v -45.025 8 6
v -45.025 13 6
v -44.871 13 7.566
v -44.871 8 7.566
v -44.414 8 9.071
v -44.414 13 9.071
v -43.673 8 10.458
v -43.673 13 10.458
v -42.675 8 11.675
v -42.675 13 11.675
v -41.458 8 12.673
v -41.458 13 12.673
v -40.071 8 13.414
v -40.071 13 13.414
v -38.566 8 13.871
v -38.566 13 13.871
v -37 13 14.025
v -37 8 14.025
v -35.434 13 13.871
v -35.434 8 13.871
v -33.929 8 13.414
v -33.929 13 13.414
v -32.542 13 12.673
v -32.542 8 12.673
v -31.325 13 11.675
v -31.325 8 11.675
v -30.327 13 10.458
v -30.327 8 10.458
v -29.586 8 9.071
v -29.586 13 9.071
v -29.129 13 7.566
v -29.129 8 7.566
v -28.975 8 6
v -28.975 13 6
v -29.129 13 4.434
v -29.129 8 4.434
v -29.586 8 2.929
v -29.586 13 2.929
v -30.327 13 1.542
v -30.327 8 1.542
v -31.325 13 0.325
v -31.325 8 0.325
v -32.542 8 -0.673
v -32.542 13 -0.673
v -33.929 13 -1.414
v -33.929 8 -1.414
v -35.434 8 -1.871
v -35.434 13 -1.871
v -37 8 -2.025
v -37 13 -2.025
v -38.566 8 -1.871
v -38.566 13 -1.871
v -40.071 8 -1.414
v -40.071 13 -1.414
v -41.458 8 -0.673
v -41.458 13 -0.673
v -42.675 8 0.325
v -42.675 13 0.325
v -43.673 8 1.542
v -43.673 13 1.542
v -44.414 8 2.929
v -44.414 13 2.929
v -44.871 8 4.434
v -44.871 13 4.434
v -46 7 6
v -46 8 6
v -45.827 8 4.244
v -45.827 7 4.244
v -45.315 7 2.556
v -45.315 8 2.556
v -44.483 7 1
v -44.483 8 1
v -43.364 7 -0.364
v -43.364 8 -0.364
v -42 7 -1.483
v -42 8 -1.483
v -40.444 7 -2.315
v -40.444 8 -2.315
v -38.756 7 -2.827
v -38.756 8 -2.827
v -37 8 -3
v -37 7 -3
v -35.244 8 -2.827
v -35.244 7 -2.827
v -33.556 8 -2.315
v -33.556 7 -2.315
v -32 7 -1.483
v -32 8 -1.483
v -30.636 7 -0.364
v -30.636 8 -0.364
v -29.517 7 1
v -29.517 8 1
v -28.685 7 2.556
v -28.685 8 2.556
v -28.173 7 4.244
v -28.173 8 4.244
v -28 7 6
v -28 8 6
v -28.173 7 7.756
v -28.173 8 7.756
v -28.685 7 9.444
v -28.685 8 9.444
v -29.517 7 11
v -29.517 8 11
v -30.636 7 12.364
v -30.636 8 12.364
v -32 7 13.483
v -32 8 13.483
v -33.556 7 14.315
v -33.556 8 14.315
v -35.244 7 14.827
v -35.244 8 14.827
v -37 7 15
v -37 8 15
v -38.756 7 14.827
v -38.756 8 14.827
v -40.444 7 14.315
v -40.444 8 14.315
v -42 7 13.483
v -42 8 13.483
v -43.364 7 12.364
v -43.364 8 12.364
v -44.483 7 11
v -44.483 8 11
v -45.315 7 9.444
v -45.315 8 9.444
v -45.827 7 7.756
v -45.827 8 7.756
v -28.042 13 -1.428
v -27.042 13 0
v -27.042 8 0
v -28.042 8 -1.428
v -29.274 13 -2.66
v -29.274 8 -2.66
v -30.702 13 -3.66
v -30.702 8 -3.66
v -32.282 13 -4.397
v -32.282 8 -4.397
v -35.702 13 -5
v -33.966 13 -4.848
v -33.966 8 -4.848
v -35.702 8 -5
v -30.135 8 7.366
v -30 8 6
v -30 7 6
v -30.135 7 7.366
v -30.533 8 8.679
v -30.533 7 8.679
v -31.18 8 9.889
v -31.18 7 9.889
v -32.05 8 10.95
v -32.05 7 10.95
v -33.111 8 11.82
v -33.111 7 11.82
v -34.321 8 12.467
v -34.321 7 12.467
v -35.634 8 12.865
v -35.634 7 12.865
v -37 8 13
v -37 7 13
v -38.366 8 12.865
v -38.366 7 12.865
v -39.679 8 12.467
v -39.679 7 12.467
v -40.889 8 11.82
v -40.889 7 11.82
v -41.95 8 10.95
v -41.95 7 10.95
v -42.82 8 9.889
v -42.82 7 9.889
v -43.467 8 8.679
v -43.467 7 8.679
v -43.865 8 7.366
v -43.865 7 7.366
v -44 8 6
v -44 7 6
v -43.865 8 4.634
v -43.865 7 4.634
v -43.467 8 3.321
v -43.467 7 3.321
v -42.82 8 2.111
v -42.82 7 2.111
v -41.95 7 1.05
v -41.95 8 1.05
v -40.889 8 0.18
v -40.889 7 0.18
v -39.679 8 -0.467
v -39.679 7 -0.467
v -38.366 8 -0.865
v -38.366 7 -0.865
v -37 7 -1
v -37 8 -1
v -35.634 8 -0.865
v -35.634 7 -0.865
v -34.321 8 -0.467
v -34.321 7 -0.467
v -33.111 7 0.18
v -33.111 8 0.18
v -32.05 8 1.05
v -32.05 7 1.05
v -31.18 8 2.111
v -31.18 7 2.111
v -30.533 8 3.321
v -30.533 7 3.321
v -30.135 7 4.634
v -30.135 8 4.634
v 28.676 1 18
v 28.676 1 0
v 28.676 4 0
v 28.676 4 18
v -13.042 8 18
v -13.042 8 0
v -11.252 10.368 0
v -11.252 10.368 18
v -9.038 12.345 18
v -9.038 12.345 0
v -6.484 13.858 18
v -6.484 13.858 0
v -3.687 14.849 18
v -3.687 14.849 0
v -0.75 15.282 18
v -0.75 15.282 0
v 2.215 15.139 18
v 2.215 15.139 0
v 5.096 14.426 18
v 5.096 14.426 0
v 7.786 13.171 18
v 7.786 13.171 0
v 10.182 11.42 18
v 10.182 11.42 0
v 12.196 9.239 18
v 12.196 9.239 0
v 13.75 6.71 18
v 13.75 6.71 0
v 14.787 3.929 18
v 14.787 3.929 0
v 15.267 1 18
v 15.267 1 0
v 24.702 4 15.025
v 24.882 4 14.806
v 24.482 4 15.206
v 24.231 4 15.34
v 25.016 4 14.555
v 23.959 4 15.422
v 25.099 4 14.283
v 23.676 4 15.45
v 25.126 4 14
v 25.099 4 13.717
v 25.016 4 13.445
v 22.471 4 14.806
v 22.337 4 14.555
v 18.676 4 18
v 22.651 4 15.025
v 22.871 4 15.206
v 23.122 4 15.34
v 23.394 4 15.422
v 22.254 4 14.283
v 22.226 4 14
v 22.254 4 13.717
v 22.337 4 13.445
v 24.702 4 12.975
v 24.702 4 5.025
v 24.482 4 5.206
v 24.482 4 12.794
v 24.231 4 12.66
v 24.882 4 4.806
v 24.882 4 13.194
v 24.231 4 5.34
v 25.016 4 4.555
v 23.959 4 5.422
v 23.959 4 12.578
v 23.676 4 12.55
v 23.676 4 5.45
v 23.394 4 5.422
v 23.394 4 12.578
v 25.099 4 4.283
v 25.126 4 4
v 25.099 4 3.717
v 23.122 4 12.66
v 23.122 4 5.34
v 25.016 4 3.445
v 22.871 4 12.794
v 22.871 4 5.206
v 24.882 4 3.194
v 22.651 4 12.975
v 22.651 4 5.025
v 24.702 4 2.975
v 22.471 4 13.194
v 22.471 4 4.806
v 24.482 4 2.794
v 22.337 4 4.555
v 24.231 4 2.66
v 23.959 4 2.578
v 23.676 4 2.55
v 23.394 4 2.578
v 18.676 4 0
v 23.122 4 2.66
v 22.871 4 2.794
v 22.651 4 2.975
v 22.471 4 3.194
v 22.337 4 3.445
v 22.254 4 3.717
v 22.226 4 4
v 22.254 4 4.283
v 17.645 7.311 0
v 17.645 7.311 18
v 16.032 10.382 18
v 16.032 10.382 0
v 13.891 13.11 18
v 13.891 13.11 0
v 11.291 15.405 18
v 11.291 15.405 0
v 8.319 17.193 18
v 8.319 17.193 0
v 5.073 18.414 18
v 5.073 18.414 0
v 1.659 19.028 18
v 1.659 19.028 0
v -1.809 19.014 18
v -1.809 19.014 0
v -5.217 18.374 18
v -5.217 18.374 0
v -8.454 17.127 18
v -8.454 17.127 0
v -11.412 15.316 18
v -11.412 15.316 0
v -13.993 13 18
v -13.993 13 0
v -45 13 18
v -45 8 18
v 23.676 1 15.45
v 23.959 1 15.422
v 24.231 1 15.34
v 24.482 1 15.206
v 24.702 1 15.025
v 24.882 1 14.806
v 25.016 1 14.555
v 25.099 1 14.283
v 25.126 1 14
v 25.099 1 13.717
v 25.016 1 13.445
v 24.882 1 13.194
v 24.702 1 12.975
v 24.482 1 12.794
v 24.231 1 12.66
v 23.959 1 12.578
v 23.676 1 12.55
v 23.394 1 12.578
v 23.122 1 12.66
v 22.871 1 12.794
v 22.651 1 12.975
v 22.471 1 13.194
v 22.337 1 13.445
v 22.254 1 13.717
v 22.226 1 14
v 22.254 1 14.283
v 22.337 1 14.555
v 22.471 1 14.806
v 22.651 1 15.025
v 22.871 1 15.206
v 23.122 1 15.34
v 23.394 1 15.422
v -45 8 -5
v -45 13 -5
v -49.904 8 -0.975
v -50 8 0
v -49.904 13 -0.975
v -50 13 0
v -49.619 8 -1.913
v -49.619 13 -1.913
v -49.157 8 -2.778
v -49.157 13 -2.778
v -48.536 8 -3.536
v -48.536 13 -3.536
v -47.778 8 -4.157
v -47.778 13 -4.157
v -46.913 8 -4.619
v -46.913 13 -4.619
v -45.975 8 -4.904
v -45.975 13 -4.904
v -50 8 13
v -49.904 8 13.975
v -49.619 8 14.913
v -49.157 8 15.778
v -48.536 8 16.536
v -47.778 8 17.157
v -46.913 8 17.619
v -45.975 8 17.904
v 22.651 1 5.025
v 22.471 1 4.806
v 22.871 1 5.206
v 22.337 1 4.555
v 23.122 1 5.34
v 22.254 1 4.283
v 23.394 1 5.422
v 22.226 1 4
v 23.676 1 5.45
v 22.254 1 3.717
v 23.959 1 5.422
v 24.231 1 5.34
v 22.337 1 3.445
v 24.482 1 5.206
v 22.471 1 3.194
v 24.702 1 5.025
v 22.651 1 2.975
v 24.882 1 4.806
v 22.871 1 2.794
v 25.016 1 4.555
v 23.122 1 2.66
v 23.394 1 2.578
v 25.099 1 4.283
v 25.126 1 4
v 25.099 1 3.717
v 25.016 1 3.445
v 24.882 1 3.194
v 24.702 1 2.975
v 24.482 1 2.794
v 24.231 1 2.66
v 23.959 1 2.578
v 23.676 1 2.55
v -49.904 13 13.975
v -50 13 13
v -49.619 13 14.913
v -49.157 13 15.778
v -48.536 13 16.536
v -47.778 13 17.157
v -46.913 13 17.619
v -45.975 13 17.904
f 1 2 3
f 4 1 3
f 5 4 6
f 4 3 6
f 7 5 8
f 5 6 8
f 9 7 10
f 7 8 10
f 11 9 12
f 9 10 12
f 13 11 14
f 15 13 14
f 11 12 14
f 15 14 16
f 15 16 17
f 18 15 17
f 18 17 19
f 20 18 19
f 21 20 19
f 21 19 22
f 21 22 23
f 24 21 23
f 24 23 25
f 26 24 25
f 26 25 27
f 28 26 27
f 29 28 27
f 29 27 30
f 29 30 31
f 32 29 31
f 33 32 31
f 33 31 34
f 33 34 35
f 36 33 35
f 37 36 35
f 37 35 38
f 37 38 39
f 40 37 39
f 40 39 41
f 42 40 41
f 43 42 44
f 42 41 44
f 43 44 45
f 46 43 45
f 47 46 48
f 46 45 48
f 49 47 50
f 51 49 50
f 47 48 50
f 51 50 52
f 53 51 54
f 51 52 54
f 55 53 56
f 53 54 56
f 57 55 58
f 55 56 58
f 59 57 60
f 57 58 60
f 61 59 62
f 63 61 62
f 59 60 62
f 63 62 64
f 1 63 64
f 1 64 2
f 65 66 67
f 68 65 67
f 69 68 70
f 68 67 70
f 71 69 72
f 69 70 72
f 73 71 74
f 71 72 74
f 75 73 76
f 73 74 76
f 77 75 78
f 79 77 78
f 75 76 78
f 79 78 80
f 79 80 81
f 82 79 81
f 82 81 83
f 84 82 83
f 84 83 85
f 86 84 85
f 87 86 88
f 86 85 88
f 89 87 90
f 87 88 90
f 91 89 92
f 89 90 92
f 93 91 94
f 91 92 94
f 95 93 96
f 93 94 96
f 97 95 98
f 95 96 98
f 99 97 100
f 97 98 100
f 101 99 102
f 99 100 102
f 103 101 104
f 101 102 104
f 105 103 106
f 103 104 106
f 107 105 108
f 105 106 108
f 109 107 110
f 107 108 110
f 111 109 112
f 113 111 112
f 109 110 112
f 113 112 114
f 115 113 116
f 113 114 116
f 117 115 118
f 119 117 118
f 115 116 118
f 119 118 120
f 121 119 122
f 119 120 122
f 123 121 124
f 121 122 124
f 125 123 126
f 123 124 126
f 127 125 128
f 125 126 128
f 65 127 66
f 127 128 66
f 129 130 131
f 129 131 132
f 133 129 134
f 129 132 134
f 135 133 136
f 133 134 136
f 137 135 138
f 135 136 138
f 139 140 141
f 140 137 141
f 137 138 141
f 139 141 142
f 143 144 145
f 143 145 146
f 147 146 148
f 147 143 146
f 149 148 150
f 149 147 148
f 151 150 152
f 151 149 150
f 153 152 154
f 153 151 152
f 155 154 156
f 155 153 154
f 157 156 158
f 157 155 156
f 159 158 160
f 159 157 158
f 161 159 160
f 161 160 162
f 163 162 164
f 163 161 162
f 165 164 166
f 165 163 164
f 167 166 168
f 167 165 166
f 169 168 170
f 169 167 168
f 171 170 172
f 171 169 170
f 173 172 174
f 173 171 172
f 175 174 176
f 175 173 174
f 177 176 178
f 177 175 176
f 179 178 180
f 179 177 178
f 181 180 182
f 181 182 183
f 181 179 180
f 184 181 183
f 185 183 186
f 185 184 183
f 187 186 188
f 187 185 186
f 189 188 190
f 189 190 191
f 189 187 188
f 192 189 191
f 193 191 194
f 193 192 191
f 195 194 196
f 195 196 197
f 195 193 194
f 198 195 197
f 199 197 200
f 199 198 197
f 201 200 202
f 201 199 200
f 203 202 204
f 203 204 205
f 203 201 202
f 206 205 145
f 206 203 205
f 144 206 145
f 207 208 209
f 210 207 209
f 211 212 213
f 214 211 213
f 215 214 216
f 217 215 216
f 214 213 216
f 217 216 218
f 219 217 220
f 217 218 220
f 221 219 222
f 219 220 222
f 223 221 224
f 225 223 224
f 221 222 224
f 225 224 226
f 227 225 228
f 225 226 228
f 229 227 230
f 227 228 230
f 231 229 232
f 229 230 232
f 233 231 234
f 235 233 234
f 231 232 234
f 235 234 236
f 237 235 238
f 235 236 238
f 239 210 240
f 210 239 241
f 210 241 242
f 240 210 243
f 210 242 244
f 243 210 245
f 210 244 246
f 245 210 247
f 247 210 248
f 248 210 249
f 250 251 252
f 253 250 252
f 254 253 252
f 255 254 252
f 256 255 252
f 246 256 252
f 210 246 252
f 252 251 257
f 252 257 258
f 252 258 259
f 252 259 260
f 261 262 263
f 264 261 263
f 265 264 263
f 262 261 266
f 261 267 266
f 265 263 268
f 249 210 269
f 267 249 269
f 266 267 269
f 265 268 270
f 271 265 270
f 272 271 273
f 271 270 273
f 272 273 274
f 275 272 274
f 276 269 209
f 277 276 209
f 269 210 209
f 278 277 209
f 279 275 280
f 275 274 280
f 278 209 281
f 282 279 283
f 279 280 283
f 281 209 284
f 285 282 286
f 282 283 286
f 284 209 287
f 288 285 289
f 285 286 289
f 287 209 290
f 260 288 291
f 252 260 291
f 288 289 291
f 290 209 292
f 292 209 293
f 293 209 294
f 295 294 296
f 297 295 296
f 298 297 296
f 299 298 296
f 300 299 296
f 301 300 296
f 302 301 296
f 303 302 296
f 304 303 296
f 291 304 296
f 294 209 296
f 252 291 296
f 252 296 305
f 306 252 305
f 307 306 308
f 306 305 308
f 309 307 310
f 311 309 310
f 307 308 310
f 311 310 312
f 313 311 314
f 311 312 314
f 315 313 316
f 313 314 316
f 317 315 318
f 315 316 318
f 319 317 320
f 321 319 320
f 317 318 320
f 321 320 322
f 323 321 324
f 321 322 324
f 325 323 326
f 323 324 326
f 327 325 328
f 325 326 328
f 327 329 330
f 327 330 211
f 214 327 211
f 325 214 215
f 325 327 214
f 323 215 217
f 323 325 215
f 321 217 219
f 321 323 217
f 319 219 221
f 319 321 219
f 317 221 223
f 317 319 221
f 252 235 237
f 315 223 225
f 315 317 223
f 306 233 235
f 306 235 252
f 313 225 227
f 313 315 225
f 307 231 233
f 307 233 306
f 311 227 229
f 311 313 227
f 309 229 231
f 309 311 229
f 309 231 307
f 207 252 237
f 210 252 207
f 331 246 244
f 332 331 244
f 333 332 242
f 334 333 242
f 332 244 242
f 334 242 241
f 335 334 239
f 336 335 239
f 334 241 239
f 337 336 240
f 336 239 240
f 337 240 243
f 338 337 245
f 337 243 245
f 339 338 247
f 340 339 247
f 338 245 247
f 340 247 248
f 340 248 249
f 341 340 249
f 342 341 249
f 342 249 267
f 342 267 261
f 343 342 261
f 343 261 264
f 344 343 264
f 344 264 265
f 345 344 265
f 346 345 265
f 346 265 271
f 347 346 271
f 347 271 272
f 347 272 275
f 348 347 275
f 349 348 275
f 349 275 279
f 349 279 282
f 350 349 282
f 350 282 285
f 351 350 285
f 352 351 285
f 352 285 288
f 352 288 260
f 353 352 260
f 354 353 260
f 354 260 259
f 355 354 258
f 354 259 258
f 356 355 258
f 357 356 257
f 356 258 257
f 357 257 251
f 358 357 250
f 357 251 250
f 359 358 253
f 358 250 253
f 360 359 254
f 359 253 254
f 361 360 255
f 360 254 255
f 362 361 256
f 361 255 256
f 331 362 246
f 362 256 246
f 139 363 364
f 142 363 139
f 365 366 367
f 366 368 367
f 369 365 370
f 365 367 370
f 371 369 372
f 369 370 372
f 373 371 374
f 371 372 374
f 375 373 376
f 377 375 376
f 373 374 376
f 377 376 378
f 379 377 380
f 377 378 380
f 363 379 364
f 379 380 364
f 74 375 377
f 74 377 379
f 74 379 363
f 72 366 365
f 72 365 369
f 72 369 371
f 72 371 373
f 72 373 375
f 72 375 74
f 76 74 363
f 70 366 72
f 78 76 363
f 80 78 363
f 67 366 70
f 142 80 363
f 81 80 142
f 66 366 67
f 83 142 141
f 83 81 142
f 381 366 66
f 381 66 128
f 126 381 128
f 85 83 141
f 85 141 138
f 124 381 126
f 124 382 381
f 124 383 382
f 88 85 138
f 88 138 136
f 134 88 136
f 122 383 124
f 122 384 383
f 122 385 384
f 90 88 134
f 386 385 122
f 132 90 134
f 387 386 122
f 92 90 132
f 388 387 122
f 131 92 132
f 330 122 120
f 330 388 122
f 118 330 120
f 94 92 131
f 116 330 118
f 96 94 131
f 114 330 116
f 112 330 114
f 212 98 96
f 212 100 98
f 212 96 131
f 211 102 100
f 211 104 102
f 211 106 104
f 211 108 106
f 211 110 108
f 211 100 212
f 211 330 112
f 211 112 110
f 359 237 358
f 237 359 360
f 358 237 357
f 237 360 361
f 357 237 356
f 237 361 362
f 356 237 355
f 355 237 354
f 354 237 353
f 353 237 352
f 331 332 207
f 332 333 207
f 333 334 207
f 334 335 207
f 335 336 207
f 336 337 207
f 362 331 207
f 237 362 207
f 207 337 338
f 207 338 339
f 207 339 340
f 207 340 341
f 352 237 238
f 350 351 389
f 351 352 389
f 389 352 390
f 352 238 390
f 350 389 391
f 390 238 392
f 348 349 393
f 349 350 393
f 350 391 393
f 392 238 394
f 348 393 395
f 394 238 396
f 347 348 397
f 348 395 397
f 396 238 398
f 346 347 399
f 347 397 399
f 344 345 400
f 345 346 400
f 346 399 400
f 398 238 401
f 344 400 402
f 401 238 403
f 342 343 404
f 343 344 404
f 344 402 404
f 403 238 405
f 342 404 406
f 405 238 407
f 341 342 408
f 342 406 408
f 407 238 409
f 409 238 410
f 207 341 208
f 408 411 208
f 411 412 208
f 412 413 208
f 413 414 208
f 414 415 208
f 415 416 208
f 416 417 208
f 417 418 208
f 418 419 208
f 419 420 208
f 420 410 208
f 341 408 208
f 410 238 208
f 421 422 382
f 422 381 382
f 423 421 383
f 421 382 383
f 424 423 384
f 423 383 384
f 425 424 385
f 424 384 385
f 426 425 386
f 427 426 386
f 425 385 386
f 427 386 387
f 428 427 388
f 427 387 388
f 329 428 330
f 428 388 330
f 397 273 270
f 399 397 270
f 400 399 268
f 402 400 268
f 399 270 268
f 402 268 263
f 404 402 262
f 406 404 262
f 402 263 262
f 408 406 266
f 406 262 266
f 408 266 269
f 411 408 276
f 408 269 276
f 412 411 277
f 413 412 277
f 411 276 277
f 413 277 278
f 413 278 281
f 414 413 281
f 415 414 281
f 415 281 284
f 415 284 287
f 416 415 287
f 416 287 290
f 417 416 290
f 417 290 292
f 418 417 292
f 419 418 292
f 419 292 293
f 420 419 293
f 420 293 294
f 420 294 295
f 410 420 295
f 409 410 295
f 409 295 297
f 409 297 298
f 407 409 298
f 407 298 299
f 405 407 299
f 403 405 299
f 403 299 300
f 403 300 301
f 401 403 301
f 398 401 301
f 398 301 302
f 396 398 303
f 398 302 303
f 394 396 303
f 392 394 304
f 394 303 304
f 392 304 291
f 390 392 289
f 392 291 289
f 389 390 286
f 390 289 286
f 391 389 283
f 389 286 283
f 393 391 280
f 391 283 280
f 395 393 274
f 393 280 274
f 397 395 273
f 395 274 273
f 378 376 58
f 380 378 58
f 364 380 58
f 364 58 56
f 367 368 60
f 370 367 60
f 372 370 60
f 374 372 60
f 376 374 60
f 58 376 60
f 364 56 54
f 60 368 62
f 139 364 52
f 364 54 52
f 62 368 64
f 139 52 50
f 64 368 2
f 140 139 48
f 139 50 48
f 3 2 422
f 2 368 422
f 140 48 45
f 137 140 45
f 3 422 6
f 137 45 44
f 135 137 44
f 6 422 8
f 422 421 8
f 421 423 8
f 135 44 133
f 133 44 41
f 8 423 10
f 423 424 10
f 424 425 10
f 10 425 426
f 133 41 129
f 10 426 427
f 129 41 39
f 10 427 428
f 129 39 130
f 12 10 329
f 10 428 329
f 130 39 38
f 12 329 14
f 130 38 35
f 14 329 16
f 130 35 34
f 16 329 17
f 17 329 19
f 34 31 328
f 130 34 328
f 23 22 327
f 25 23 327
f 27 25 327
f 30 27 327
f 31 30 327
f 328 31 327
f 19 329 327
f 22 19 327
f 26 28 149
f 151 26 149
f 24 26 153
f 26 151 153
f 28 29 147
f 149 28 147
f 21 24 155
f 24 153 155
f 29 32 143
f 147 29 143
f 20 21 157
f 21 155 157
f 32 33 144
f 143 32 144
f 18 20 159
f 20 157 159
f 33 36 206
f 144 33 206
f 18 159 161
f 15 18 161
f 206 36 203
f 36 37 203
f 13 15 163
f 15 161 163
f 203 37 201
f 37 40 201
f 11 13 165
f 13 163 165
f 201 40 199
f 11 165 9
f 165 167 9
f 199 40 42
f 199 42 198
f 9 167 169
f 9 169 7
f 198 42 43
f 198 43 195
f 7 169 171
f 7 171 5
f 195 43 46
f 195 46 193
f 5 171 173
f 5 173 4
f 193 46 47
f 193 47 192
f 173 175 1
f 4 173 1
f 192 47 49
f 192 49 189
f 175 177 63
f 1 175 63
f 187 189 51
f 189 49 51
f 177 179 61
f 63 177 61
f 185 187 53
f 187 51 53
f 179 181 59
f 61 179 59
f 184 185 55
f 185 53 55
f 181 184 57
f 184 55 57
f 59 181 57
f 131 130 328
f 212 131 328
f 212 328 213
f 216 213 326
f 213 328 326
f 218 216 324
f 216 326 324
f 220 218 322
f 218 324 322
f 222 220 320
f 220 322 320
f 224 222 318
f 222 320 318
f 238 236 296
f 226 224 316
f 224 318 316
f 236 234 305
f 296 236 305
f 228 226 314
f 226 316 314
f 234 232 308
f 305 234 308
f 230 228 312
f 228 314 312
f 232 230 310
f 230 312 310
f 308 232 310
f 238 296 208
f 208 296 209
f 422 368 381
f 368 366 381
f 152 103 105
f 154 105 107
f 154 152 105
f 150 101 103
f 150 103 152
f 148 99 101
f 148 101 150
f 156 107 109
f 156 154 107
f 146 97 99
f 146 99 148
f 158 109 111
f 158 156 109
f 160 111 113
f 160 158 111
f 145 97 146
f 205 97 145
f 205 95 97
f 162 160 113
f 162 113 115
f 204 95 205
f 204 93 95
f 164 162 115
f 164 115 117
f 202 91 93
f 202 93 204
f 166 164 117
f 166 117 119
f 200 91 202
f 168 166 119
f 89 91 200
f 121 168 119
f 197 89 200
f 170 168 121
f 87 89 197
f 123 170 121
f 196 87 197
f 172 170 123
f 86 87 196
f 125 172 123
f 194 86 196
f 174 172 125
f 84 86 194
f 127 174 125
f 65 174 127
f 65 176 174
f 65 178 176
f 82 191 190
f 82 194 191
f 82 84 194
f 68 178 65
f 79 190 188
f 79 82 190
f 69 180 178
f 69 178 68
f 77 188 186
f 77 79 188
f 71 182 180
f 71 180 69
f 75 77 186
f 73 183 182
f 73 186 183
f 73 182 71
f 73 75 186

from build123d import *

# Parameters (mm, degrees)
BOSS_EXTRUDE1_DEPTH = 18
SKETCH3_R           = 1.45
CUT_EXTRUDE1_DEPTH  = 56.244999774
SKETCH5_W           = 22.958144304
SKETCH5_H           = 5
BOSS_EXTRUDE2_DEPTH = 5
SKETCH6_R           = 8.025
CUT_EXTRUDE2_DEPTH  = 55.479353888
SKETCH7_R           = 9
SKETCH7_R_2         = 7
BOSS_EXTRUDE3_DEPTH = 1
FILLET1_R           = 5
FILLET2_R           = 10


with BuildPart() as part:
    # Sketch1 → Boss-Extrude1 (new body)
    with BuildSketch(Plane.XY):
        with BuildLine():
            Line((15.267285286, 1), (28.676455767, 1))
            Line((28.676455767, 1), (28.676455767, 4))
            Line((28.676455767, 4), (18.676455767, 4))
            ThreePointArc((18.676455767, 4), (5.072789326, 18.414038353), (-13.99321264, 13))
            Line((-13.99321264, 13), (-50, 13))
            Line((-50, 13), (-50, 8))
            Line((-50, 8), (-13.041855696, 8))
            ThreePointArc((-13.041855696, 8), (3.67261953, 14.852672008), (15.267285286, 1))
        make_face()
    extrude(amount=BOSS_EXTRUDE1_DEPTH)

    # Sketch3 → Cut-Extrude1 (cut, through all)
    with BuildSketch(Plane(origin=(0, 4, 0), x_dir=(1, 0, 0), z_dir=(0, 1, 0))):
        with Locations(Location((23.676455767, -4, 0), (0, 0, 270))):
            Circle(SKETCH3_R)
        with Locations(Location((23.676455767, -14, 0), (0, 0, 270))):
            Circle(SKETCH3_R)
    extrude(amount=-CUT_EXTRUDE1_DEPTH, mode=Mode.SUBTRACT)

    # Sketch5 → Boss-Extrude2 (add)
    with BuildSketch(Plane.XZ.offset(-8)):
        with Locations((-38.520927848, -2.5)):
            Rectangle(SKETCH5_W, SKETCH5_H)
    extrude(amount=-BOSS_EXTRUDE2_DEPTH)

    # Sketch6 → Cut-Extrude2 (cut, through all)
    with BuildSketch(Plane(origin=(0, 13, 0), x_dir=(1, 0, 0), z_dir=(0, 1, 0))):
        with Locations(Location((-37, -6, 0), (0, 0, 180))):
            Circle(SKETCH6_R)
    extrude(amount=-CUT_EXTRUDE2_DEPTH, mode=Mode.SUBTRACT)

    # Sketch7 → Boss-Extrude3 (add)
    with BuildSketch(Plane.XZ.offset(-8)):
        with Locations(Location((-37, 6, 0), (0, 0, 180))):
            Circle(SKETCH7_R)
        with Locations((-37, 6)):
            Circle(SKETCH7_R_2, mode=Mode.SUBTRACT)
    extrude(amount=BOSS_EXTRUDE3_DEPTH)

    # Fillet1
    fillet1_edges = [part.edges().sort_by_distance(p)[0] for p in [
        (-50, 10.5, 18),
        (-50, 10.5, -5),
    ]]
    fillet(fillet1_edges, radius=FILLET1_R)

    # Fillet2
    # the kernel refuses this fillet: 10 mm, written as the material it takes off along each edge
    with BuildSketch(Plane(origin=(-27.041855696, -13.650635095, -5), x_dir=(0, 0, 1), z_dir=(0, 1, 0))) as fillet2_piece_1:
        with BuildLine():
            CenterArc((10, -8.660254038), FILLET2_R, 120, 60)
            Line((0, -8.660254038), (-0.2, -8.660254038))
            Line((-0.2, -8.660254038), (-0.2, 0))
            Line((-0.2, 0), (0, 0.2))
            ThreePointArc((0, 0.2), (2.5, 0.2), (4.9, 0.173205081))
            Line((4.9, 0.173205081), (5, 0))
        make_face()
    extrude(amount=48.301270189, mode=Mode.SUBTRACT)


solid = part.part
